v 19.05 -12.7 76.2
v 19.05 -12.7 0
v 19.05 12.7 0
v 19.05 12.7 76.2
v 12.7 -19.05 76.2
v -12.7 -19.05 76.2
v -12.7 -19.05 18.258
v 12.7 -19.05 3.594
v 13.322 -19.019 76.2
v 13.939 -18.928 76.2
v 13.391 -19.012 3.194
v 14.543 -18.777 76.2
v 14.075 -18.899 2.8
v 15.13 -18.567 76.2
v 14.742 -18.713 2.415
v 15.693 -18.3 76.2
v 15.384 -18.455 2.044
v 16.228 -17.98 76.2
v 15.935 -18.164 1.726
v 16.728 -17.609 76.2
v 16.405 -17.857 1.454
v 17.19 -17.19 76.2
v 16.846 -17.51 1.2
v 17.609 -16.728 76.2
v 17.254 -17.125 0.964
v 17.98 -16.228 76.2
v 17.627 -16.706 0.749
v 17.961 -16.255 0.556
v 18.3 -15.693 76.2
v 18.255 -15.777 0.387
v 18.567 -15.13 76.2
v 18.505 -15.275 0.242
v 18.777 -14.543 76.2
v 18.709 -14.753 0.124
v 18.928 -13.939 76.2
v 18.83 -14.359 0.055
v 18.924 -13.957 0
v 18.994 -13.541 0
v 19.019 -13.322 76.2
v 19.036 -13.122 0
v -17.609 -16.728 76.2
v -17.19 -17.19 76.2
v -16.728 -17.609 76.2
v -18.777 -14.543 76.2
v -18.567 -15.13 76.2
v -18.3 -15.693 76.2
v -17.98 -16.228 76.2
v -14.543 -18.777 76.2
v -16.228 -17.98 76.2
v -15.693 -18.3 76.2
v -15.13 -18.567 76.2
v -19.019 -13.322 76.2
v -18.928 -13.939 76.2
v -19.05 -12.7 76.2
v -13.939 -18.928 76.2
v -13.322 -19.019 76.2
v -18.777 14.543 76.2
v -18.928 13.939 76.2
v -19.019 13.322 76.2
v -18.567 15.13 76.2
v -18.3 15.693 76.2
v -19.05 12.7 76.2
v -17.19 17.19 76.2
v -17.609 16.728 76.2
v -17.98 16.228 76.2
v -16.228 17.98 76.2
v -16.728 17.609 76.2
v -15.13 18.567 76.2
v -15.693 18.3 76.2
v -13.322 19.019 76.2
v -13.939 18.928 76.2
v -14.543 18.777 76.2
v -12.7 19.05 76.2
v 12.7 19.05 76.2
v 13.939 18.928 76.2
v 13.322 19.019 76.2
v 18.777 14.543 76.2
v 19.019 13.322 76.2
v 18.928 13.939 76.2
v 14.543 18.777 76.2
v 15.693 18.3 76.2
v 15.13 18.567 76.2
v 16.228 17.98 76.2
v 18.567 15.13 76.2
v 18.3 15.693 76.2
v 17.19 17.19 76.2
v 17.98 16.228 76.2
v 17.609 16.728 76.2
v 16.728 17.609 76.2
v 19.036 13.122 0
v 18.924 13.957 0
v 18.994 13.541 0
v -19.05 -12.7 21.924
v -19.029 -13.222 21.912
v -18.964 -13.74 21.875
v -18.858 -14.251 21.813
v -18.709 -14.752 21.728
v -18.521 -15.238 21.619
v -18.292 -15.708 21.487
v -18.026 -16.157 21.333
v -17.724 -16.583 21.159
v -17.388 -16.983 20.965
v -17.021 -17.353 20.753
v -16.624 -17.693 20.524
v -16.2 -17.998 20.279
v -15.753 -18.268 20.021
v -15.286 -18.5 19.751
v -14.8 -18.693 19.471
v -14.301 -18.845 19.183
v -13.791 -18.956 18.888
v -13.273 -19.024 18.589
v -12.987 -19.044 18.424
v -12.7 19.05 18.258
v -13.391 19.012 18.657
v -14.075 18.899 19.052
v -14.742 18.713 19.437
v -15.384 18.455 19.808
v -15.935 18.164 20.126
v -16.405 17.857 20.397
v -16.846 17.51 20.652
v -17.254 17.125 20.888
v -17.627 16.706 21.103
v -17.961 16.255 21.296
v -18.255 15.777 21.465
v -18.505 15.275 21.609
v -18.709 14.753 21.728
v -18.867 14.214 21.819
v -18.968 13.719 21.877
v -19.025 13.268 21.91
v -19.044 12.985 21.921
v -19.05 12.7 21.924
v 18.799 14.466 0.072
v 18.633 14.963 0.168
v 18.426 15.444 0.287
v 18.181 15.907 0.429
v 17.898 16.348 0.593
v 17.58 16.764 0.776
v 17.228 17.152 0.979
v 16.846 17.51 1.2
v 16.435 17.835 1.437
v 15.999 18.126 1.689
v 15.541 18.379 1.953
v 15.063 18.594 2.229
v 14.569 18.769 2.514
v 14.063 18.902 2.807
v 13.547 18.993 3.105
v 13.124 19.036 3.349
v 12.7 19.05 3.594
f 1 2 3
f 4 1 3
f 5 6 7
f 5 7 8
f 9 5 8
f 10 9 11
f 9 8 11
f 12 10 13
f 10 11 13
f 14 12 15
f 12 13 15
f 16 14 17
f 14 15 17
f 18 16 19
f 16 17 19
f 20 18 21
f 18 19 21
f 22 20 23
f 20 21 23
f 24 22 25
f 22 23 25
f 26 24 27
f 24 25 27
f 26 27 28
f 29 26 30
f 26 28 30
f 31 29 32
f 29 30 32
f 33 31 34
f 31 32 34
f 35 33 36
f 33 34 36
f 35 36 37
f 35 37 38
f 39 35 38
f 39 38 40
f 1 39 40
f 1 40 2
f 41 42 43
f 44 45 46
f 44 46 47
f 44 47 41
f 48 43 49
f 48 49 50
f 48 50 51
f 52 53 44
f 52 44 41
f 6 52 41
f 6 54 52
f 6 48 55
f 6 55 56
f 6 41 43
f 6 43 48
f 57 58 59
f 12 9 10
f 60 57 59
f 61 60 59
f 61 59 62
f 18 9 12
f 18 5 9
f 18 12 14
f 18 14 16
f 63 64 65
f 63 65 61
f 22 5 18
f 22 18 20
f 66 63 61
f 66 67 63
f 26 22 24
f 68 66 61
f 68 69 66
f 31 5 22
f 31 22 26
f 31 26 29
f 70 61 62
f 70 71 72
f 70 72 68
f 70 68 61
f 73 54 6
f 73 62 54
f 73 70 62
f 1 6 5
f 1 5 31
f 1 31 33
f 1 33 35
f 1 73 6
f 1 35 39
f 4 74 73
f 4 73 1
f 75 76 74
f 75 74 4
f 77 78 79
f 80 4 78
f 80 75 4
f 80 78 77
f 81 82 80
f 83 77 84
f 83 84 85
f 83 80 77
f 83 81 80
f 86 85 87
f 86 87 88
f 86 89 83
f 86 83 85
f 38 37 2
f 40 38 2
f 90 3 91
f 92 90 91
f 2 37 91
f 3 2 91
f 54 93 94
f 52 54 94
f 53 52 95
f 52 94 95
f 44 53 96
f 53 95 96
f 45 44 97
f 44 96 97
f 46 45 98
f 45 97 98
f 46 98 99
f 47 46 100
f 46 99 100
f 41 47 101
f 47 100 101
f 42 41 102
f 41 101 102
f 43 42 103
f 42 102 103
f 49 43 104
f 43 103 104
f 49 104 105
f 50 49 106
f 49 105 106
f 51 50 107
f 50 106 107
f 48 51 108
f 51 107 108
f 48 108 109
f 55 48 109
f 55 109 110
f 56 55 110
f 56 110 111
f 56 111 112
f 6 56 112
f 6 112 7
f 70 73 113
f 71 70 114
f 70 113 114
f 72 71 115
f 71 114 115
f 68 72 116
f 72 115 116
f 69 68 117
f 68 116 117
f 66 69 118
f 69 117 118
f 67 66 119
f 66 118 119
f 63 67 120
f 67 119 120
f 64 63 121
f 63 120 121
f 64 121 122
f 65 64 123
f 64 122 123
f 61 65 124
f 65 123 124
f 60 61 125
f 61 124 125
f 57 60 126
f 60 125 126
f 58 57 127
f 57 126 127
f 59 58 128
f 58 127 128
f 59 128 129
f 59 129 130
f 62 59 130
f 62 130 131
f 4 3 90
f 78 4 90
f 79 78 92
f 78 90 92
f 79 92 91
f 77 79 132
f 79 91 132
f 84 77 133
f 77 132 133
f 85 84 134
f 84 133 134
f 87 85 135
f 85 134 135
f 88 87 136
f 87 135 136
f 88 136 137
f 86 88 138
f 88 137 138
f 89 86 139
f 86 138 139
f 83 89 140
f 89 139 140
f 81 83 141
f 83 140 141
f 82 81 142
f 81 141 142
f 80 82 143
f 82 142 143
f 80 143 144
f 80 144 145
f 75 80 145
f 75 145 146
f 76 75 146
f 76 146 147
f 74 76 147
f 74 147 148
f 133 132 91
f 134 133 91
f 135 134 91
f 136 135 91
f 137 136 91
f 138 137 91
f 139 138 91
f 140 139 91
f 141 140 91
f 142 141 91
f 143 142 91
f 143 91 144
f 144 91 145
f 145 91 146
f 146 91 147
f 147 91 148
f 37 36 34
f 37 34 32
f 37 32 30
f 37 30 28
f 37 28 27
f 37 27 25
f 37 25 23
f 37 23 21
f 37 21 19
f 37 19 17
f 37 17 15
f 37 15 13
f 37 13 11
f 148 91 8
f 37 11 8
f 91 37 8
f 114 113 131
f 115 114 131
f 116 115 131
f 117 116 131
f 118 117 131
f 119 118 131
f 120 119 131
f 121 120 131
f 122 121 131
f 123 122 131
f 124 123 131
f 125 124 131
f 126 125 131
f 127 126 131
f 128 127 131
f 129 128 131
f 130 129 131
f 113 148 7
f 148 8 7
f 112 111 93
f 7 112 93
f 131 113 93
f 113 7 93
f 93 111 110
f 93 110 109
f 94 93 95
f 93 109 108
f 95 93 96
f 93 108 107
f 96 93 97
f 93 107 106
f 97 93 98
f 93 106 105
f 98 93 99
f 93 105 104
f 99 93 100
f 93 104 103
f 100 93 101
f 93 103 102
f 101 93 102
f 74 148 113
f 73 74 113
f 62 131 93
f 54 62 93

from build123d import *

# Parameters (mm, degrees)
F1_DEPTH = 76.2
F3_DEPTH = 19.05


with BuildPart() as f1:
    # F0 (on Top) → F1 (new body)
    with BuildSketch(Plane.XY):
        with BuildLine():
            ThreePointArc((19.05, 12.7), (17.190128, 17.190128), (12.7, 19.05))
            Line((12.7, 19.05), (-12.7, 19.05))
            ThreePointArc((-12.7, 19.05), (-17.190128, 17.190128), (-19.05, 12.7))
            Line((-19.05, 12.7), (-19.05, -12.7))
            ThreePointArc((-19.05, -12.7), (-17.190128, -17.190128), (-12.7, -19.05))
            Line((-12.7, -19.05), (12.7, -19.05))
            ThreePointArc((12.7, -19.05), (17.190128, -17.190128), (19.05, -12.7))
            Line((19.05, -12.7), (19.05, 12.7))
        make_face()
    extrude(amount=F1_DEPTH)

    # F2 (on Front) → F3 (cut, symmetric)
    with BuildSketch(Plane.XZ):
        Polygon((18.924247, 0), (-19.05, 21.924442), (-19.05, 0), align=None)
    extrude(amount=F3_DEPTH, both=True, mode=Mode.SUBTRACT)


solid = f1.part
